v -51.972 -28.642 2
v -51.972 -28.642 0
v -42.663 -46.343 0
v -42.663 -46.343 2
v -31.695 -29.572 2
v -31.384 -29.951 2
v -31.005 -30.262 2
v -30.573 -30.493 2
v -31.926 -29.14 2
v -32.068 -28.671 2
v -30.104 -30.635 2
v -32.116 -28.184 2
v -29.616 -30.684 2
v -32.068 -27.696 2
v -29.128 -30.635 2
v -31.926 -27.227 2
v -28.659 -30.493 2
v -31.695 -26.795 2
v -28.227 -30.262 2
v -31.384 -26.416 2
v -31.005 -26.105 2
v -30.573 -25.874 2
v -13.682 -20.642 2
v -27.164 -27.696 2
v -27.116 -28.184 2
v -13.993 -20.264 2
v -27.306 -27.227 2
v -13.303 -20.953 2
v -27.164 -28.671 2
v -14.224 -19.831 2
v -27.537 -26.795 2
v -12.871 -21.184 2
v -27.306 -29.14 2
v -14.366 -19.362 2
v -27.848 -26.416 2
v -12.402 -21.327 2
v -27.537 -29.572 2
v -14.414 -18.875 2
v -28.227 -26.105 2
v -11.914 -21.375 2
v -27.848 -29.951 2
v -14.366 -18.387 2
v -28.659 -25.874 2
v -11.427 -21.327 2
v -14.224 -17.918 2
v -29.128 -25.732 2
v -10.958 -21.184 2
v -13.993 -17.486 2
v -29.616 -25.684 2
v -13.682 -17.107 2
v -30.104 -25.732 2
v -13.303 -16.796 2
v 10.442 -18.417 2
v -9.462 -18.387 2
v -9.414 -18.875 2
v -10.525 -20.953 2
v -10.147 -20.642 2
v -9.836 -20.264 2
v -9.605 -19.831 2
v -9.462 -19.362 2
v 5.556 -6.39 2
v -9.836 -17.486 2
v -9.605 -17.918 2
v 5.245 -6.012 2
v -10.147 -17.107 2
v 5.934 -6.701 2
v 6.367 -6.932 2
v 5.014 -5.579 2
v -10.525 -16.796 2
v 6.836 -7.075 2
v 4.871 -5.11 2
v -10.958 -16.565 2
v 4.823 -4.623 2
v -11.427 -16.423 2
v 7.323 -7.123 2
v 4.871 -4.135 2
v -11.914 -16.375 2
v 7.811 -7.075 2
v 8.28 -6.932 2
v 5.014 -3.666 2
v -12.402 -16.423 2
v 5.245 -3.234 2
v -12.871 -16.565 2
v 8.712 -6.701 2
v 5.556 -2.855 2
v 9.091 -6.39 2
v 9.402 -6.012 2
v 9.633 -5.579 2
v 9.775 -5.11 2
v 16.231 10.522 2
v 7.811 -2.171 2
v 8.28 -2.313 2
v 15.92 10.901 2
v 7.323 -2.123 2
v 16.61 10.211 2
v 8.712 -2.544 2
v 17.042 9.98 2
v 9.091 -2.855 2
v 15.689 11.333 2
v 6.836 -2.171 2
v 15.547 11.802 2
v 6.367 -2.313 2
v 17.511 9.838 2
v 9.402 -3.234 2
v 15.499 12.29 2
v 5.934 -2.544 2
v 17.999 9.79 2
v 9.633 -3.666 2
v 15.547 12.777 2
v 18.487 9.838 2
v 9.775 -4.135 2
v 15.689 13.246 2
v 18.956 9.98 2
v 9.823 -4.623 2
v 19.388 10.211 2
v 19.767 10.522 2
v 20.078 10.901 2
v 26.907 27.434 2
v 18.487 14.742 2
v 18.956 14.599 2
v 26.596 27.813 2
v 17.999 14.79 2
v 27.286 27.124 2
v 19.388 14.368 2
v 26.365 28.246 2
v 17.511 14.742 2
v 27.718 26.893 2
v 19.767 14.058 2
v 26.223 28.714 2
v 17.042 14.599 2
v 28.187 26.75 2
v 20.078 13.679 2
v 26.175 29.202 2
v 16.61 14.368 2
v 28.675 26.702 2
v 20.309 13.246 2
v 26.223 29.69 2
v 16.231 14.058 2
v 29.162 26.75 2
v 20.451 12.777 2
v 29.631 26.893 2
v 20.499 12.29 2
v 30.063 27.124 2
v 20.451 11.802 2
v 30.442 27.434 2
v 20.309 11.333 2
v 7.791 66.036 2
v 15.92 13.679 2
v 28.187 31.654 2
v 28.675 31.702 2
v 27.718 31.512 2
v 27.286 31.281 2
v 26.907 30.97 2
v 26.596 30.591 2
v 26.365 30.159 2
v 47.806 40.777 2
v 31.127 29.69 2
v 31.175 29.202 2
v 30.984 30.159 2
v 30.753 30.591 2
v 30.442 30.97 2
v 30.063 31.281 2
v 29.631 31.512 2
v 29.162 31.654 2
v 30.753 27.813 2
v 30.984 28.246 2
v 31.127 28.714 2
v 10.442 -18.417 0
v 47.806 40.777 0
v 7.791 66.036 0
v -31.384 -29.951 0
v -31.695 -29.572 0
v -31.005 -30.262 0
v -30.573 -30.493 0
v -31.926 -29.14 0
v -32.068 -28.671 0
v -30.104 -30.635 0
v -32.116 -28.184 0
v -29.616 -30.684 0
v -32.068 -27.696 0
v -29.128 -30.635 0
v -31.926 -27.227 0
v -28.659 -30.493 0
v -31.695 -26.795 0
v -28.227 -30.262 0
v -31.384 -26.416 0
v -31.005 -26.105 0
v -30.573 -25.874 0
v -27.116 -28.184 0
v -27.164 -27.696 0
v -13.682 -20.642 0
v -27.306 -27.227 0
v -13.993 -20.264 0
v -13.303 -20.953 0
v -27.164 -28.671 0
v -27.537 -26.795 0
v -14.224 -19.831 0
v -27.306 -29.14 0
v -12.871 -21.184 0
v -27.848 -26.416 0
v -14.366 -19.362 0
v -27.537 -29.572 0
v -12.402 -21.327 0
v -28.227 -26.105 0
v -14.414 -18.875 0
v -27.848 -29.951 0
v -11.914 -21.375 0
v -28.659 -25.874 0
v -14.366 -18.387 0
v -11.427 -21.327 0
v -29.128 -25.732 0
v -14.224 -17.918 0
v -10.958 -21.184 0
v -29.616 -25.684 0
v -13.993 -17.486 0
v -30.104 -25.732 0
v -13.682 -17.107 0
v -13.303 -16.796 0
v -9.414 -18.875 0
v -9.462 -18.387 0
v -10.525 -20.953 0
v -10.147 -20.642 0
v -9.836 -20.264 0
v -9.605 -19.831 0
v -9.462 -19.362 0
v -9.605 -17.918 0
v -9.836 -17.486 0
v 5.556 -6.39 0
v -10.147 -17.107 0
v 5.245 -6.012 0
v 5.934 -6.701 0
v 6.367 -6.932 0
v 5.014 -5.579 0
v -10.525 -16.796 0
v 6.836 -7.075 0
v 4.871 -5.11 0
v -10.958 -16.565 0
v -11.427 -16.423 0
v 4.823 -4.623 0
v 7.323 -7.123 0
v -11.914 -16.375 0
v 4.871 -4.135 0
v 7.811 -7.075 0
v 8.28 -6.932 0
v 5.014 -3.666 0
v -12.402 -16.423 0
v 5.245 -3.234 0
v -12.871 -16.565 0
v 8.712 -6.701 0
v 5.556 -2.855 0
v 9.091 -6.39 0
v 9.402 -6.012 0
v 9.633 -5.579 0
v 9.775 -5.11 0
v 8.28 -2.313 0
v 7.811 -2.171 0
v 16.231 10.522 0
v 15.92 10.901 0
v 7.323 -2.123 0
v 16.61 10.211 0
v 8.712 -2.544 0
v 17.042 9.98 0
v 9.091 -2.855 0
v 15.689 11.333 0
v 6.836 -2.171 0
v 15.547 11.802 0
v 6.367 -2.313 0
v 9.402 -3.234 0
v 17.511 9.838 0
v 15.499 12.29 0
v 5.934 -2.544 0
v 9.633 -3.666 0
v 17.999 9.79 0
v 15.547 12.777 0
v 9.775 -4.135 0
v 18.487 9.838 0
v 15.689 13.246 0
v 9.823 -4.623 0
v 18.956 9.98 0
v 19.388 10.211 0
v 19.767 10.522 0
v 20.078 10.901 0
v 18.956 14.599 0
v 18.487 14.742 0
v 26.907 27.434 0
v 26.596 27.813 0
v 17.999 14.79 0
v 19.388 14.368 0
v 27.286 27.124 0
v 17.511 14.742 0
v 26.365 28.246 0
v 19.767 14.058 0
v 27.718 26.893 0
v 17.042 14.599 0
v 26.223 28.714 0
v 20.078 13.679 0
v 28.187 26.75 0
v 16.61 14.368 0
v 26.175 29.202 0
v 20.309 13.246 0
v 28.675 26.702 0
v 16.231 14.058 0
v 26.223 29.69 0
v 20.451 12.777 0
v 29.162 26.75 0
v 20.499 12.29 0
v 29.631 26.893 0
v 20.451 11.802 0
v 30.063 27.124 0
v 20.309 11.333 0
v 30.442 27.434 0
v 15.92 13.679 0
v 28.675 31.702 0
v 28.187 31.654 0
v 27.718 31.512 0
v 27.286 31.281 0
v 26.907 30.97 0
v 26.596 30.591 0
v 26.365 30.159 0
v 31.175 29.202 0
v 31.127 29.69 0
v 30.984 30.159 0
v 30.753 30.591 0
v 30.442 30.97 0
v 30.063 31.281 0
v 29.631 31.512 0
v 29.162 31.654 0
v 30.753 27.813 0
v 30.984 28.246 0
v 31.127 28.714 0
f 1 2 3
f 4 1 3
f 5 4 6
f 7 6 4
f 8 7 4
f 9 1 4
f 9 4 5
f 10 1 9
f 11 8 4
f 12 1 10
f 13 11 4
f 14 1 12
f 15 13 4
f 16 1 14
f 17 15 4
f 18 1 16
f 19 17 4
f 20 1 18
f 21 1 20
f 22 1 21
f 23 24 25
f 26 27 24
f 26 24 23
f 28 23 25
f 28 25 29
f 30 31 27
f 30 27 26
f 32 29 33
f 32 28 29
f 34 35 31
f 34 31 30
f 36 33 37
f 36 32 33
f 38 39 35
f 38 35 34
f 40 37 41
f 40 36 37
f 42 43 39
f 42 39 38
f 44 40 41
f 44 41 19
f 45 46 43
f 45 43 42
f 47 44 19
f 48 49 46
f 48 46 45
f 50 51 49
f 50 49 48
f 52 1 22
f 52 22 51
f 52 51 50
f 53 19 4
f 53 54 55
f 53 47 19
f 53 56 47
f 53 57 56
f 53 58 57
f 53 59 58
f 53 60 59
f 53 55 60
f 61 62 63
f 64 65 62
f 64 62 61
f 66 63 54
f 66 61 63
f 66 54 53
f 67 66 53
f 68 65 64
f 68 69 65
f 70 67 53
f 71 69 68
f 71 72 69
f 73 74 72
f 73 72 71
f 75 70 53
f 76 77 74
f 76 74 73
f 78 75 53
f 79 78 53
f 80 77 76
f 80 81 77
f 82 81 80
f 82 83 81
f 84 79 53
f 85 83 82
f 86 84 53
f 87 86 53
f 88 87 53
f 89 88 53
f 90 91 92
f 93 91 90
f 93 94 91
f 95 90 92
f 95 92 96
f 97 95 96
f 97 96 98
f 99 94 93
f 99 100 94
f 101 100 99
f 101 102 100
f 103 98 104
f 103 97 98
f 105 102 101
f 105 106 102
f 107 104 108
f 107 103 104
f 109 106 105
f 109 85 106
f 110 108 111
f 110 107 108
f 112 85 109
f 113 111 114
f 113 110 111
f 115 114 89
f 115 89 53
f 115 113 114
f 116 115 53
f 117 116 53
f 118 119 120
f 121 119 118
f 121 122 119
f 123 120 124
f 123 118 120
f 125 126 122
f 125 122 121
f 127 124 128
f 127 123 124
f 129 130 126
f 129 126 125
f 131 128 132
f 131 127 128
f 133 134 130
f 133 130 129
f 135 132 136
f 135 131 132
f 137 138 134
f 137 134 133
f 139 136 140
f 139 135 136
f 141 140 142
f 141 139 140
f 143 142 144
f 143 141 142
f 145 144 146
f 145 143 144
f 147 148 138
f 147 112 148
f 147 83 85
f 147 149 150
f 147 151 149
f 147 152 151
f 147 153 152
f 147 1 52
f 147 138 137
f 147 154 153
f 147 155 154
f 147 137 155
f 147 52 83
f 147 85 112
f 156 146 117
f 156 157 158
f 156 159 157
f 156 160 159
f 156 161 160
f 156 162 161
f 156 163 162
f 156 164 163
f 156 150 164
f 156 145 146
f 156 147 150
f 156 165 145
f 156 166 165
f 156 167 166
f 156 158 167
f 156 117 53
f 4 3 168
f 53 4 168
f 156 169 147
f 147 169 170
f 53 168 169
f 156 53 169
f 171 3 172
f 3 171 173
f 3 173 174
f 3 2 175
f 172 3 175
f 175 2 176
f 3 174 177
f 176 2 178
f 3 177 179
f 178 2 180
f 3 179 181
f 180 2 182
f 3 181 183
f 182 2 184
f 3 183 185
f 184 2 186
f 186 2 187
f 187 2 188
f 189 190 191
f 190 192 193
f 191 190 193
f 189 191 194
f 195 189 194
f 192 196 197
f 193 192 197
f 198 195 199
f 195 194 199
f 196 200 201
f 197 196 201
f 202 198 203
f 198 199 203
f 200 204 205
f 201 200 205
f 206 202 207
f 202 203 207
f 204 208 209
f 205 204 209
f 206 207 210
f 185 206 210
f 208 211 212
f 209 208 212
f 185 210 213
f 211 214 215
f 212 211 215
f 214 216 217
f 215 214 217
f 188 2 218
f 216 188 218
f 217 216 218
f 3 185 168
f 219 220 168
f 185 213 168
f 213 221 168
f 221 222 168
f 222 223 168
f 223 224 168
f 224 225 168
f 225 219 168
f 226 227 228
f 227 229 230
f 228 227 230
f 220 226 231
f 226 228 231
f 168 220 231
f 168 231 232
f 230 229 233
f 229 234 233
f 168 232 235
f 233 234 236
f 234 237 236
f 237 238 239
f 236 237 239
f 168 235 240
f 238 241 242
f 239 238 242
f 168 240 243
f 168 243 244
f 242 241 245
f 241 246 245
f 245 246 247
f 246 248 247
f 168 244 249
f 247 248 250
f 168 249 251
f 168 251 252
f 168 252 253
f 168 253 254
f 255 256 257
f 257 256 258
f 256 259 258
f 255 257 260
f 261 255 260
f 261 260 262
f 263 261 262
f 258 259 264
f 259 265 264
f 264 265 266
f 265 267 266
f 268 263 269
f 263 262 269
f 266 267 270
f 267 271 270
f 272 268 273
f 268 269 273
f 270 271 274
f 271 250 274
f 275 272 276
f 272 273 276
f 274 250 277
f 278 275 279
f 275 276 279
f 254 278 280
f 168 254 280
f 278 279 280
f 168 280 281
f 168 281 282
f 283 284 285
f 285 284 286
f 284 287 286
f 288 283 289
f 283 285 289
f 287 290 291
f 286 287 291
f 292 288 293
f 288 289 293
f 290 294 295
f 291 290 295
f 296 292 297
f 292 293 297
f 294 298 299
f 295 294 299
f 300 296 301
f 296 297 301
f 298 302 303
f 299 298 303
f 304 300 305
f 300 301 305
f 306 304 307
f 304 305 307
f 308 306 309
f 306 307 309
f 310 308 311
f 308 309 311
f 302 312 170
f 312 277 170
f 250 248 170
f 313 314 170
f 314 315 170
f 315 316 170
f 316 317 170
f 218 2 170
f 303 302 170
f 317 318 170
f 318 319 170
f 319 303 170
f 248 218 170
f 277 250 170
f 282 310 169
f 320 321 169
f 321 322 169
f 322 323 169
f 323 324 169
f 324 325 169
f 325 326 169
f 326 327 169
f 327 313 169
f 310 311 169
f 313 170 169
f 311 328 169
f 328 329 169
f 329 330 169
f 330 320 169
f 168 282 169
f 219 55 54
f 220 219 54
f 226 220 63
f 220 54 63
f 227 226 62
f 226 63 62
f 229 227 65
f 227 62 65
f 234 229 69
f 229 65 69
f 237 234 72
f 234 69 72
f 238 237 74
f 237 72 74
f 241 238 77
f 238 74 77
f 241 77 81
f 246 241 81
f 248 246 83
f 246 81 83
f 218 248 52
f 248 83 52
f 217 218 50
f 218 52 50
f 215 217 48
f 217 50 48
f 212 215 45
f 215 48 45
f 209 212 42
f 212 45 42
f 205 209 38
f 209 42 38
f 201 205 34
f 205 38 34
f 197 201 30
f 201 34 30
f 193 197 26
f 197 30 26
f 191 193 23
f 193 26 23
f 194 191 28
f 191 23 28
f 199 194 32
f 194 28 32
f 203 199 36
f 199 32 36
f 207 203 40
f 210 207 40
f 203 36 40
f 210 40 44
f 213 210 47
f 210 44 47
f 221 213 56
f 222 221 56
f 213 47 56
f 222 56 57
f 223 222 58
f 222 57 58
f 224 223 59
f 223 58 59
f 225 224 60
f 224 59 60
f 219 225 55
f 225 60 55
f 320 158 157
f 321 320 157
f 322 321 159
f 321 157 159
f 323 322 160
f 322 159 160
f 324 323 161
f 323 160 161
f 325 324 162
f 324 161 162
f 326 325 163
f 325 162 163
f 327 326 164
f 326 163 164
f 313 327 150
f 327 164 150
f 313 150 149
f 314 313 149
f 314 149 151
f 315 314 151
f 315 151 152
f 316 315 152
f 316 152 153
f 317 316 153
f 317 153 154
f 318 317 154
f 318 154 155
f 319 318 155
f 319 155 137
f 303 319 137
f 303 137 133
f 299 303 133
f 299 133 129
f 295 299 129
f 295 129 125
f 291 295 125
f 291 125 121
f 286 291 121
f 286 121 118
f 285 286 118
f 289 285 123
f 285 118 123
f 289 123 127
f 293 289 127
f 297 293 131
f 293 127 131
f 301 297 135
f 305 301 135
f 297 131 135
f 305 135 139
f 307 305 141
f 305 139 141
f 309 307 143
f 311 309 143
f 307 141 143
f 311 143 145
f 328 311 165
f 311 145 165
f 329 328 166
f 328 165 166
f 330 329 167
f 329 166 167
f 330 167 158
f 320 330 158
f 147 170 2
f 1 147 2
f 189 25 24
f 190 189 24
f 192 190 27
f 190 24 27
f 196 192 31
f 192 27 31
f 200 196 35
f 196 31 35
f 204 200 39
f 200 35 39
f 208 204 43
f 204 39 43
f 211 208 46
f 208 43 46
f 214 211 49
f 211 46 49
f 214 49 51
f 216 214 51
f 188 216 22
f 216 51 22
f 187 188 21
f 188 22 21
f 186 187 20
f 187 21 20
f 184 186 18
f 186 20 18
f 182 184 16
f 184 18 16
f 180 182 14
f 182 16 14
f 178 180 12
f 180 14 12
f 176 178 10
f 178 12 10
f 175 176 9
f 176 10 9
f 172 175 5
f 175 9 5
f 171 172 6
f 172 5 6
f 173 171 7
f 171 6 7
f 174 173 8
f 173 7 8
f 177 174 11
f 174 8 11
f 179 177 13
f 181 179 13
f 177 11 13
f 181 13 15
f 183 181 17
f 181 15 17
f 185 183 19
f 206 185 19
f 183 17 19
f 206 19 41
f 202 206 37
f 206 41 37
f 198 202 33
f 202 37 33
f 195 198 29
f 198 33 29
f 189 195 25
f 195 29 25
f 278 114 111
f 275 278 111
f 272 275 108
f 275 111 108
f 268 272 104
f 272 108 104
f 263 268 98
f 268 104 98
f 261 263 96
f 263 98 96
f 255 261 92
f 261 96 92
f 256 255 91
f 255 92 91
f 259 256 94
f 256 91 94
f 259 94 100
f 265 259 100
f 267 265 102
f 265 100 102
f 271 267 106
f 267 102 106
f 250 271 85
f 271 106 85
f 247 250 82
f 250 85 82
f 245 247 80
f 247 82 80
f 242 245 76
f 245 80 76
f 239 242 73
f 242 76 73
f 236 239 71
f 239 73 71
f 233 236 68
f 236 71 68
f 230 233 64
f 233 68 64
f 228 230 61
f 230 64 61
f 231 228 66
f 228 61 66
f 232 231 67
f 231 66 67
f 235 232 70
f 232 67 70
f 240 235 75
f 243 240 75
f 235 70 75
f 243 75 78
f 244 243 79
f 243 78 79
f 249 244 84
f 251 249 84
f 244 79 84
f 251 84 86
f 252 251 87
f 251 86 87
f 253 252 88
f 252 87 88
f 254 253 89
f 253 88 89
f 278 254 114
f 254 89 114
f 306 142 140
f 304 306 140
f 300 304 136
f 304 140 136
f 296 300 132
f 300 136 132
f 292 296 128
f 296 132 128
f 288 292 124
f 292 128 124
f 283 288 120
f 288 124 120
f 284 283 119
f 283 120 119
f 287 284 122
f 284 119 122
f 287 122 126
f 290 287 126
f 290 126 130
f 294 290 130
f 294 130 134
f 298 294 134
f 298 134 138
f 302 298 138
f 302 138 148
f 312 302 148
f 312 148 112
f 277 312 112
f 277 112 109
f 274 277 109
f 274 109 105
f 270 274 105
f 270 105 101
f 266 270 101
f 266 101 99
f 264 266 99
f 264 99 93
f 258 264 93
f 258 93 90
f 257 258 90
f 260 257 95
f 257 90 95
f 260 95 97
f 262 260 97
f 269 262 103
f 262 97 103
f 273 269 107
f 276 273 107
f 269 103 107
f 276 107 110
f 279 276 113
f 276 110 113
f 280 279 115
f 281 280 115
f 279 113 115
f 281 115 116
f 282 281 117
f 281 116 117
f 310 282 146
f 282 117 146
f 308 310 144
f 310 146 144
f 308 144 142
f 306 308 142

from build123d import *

# Parameters (mm, degrees)
BOSS_EXTRUDE1_DEPTH = 2
SKETCH5_R           = 2.5
CUT_EXTRUDE1_DEPTH  = 2
SKETCH6_R           = 2.5
CUT_EXTRUDE2_DEPTH  = 2
SKETCH7_R           = 2.5
CUT_EXTRUDE3_DEPTH  = 2
SKETCH8_R           = 2.5
CUT_EXTRUDE4_DEPTH  = 40
SKETCH9_R           = 2.5
CUT_EXTRUDE5_DEPTH  = 40


with BuildPart() as part:
    # Sketch2 → Boss-Extrude1 (new body)
    with BuildSketch(Plane.XY):
        Polygon((47.806423209, 40.776843682), (7.791142002, 66.035659063), (-51.971856858, -28.641512814), (-42.663063156, -46.343104828), (10.441712886, -18.416723725), align=None)
    extrude(amount=BOSS_EXTRUDE1_DEPTH)

    # Sketch5 → Cut-Extrude1 (cut)
    with BuildSketch(Plane.XY.offset(2)):
        with Locations((-11.914275979, -18.874721419)):
            Circle(SKETCH5_R)
    extrude(amount=-CUT_EXTRUDE1_DEPTH, mode=Mode.SUBTRACT)

    # Sketch6 → Cut-Extrude2 (cut)
    with BuildSketch(Plane.XY.offset(2)):
        with Locations((-29.615867993, -28.18351512)):
            Circle(SKETCH6_R)
    extrude(amount=-CUT_EXTRUDE2_DEPTH, mode=Mode.SUBTRACT)

    # Sketch7 → Cut-Extrude3 (cut)
    with BuildSketch(Plane.XY.offset(2)):
        with Locations((7.323304731, -4.622684049)):
            Circle(SKETCH7_R)
    extrude(amount=-CUT_EXTRUDE3_DEPTH, mode=Mode.SUBTRACT)

    # Sketch8 → Cut-Extrude4 (cut)
    with BuildSketch(Plane.XY.offset(2)):
        with Locations((17.998936252, 12.289763781)):
            Circle(SKETCH8_R)
    extrude(amount=-CUT_EXTRUDE4_DEPTH, mode=Mode.SUBTRACT)

    # Sketch9 → Cut-Extrude5 (cut)
    with BuildSketch(Plane.XY.offset(2)):
        with Locations((28.674567773, 29.202211612)):
            Circle(SKETCH9_R)
    extrude(amount=-CUT_EXTRUDE5_DEPTH, mode=Mode.SUBTRACT)


solid = part.part
